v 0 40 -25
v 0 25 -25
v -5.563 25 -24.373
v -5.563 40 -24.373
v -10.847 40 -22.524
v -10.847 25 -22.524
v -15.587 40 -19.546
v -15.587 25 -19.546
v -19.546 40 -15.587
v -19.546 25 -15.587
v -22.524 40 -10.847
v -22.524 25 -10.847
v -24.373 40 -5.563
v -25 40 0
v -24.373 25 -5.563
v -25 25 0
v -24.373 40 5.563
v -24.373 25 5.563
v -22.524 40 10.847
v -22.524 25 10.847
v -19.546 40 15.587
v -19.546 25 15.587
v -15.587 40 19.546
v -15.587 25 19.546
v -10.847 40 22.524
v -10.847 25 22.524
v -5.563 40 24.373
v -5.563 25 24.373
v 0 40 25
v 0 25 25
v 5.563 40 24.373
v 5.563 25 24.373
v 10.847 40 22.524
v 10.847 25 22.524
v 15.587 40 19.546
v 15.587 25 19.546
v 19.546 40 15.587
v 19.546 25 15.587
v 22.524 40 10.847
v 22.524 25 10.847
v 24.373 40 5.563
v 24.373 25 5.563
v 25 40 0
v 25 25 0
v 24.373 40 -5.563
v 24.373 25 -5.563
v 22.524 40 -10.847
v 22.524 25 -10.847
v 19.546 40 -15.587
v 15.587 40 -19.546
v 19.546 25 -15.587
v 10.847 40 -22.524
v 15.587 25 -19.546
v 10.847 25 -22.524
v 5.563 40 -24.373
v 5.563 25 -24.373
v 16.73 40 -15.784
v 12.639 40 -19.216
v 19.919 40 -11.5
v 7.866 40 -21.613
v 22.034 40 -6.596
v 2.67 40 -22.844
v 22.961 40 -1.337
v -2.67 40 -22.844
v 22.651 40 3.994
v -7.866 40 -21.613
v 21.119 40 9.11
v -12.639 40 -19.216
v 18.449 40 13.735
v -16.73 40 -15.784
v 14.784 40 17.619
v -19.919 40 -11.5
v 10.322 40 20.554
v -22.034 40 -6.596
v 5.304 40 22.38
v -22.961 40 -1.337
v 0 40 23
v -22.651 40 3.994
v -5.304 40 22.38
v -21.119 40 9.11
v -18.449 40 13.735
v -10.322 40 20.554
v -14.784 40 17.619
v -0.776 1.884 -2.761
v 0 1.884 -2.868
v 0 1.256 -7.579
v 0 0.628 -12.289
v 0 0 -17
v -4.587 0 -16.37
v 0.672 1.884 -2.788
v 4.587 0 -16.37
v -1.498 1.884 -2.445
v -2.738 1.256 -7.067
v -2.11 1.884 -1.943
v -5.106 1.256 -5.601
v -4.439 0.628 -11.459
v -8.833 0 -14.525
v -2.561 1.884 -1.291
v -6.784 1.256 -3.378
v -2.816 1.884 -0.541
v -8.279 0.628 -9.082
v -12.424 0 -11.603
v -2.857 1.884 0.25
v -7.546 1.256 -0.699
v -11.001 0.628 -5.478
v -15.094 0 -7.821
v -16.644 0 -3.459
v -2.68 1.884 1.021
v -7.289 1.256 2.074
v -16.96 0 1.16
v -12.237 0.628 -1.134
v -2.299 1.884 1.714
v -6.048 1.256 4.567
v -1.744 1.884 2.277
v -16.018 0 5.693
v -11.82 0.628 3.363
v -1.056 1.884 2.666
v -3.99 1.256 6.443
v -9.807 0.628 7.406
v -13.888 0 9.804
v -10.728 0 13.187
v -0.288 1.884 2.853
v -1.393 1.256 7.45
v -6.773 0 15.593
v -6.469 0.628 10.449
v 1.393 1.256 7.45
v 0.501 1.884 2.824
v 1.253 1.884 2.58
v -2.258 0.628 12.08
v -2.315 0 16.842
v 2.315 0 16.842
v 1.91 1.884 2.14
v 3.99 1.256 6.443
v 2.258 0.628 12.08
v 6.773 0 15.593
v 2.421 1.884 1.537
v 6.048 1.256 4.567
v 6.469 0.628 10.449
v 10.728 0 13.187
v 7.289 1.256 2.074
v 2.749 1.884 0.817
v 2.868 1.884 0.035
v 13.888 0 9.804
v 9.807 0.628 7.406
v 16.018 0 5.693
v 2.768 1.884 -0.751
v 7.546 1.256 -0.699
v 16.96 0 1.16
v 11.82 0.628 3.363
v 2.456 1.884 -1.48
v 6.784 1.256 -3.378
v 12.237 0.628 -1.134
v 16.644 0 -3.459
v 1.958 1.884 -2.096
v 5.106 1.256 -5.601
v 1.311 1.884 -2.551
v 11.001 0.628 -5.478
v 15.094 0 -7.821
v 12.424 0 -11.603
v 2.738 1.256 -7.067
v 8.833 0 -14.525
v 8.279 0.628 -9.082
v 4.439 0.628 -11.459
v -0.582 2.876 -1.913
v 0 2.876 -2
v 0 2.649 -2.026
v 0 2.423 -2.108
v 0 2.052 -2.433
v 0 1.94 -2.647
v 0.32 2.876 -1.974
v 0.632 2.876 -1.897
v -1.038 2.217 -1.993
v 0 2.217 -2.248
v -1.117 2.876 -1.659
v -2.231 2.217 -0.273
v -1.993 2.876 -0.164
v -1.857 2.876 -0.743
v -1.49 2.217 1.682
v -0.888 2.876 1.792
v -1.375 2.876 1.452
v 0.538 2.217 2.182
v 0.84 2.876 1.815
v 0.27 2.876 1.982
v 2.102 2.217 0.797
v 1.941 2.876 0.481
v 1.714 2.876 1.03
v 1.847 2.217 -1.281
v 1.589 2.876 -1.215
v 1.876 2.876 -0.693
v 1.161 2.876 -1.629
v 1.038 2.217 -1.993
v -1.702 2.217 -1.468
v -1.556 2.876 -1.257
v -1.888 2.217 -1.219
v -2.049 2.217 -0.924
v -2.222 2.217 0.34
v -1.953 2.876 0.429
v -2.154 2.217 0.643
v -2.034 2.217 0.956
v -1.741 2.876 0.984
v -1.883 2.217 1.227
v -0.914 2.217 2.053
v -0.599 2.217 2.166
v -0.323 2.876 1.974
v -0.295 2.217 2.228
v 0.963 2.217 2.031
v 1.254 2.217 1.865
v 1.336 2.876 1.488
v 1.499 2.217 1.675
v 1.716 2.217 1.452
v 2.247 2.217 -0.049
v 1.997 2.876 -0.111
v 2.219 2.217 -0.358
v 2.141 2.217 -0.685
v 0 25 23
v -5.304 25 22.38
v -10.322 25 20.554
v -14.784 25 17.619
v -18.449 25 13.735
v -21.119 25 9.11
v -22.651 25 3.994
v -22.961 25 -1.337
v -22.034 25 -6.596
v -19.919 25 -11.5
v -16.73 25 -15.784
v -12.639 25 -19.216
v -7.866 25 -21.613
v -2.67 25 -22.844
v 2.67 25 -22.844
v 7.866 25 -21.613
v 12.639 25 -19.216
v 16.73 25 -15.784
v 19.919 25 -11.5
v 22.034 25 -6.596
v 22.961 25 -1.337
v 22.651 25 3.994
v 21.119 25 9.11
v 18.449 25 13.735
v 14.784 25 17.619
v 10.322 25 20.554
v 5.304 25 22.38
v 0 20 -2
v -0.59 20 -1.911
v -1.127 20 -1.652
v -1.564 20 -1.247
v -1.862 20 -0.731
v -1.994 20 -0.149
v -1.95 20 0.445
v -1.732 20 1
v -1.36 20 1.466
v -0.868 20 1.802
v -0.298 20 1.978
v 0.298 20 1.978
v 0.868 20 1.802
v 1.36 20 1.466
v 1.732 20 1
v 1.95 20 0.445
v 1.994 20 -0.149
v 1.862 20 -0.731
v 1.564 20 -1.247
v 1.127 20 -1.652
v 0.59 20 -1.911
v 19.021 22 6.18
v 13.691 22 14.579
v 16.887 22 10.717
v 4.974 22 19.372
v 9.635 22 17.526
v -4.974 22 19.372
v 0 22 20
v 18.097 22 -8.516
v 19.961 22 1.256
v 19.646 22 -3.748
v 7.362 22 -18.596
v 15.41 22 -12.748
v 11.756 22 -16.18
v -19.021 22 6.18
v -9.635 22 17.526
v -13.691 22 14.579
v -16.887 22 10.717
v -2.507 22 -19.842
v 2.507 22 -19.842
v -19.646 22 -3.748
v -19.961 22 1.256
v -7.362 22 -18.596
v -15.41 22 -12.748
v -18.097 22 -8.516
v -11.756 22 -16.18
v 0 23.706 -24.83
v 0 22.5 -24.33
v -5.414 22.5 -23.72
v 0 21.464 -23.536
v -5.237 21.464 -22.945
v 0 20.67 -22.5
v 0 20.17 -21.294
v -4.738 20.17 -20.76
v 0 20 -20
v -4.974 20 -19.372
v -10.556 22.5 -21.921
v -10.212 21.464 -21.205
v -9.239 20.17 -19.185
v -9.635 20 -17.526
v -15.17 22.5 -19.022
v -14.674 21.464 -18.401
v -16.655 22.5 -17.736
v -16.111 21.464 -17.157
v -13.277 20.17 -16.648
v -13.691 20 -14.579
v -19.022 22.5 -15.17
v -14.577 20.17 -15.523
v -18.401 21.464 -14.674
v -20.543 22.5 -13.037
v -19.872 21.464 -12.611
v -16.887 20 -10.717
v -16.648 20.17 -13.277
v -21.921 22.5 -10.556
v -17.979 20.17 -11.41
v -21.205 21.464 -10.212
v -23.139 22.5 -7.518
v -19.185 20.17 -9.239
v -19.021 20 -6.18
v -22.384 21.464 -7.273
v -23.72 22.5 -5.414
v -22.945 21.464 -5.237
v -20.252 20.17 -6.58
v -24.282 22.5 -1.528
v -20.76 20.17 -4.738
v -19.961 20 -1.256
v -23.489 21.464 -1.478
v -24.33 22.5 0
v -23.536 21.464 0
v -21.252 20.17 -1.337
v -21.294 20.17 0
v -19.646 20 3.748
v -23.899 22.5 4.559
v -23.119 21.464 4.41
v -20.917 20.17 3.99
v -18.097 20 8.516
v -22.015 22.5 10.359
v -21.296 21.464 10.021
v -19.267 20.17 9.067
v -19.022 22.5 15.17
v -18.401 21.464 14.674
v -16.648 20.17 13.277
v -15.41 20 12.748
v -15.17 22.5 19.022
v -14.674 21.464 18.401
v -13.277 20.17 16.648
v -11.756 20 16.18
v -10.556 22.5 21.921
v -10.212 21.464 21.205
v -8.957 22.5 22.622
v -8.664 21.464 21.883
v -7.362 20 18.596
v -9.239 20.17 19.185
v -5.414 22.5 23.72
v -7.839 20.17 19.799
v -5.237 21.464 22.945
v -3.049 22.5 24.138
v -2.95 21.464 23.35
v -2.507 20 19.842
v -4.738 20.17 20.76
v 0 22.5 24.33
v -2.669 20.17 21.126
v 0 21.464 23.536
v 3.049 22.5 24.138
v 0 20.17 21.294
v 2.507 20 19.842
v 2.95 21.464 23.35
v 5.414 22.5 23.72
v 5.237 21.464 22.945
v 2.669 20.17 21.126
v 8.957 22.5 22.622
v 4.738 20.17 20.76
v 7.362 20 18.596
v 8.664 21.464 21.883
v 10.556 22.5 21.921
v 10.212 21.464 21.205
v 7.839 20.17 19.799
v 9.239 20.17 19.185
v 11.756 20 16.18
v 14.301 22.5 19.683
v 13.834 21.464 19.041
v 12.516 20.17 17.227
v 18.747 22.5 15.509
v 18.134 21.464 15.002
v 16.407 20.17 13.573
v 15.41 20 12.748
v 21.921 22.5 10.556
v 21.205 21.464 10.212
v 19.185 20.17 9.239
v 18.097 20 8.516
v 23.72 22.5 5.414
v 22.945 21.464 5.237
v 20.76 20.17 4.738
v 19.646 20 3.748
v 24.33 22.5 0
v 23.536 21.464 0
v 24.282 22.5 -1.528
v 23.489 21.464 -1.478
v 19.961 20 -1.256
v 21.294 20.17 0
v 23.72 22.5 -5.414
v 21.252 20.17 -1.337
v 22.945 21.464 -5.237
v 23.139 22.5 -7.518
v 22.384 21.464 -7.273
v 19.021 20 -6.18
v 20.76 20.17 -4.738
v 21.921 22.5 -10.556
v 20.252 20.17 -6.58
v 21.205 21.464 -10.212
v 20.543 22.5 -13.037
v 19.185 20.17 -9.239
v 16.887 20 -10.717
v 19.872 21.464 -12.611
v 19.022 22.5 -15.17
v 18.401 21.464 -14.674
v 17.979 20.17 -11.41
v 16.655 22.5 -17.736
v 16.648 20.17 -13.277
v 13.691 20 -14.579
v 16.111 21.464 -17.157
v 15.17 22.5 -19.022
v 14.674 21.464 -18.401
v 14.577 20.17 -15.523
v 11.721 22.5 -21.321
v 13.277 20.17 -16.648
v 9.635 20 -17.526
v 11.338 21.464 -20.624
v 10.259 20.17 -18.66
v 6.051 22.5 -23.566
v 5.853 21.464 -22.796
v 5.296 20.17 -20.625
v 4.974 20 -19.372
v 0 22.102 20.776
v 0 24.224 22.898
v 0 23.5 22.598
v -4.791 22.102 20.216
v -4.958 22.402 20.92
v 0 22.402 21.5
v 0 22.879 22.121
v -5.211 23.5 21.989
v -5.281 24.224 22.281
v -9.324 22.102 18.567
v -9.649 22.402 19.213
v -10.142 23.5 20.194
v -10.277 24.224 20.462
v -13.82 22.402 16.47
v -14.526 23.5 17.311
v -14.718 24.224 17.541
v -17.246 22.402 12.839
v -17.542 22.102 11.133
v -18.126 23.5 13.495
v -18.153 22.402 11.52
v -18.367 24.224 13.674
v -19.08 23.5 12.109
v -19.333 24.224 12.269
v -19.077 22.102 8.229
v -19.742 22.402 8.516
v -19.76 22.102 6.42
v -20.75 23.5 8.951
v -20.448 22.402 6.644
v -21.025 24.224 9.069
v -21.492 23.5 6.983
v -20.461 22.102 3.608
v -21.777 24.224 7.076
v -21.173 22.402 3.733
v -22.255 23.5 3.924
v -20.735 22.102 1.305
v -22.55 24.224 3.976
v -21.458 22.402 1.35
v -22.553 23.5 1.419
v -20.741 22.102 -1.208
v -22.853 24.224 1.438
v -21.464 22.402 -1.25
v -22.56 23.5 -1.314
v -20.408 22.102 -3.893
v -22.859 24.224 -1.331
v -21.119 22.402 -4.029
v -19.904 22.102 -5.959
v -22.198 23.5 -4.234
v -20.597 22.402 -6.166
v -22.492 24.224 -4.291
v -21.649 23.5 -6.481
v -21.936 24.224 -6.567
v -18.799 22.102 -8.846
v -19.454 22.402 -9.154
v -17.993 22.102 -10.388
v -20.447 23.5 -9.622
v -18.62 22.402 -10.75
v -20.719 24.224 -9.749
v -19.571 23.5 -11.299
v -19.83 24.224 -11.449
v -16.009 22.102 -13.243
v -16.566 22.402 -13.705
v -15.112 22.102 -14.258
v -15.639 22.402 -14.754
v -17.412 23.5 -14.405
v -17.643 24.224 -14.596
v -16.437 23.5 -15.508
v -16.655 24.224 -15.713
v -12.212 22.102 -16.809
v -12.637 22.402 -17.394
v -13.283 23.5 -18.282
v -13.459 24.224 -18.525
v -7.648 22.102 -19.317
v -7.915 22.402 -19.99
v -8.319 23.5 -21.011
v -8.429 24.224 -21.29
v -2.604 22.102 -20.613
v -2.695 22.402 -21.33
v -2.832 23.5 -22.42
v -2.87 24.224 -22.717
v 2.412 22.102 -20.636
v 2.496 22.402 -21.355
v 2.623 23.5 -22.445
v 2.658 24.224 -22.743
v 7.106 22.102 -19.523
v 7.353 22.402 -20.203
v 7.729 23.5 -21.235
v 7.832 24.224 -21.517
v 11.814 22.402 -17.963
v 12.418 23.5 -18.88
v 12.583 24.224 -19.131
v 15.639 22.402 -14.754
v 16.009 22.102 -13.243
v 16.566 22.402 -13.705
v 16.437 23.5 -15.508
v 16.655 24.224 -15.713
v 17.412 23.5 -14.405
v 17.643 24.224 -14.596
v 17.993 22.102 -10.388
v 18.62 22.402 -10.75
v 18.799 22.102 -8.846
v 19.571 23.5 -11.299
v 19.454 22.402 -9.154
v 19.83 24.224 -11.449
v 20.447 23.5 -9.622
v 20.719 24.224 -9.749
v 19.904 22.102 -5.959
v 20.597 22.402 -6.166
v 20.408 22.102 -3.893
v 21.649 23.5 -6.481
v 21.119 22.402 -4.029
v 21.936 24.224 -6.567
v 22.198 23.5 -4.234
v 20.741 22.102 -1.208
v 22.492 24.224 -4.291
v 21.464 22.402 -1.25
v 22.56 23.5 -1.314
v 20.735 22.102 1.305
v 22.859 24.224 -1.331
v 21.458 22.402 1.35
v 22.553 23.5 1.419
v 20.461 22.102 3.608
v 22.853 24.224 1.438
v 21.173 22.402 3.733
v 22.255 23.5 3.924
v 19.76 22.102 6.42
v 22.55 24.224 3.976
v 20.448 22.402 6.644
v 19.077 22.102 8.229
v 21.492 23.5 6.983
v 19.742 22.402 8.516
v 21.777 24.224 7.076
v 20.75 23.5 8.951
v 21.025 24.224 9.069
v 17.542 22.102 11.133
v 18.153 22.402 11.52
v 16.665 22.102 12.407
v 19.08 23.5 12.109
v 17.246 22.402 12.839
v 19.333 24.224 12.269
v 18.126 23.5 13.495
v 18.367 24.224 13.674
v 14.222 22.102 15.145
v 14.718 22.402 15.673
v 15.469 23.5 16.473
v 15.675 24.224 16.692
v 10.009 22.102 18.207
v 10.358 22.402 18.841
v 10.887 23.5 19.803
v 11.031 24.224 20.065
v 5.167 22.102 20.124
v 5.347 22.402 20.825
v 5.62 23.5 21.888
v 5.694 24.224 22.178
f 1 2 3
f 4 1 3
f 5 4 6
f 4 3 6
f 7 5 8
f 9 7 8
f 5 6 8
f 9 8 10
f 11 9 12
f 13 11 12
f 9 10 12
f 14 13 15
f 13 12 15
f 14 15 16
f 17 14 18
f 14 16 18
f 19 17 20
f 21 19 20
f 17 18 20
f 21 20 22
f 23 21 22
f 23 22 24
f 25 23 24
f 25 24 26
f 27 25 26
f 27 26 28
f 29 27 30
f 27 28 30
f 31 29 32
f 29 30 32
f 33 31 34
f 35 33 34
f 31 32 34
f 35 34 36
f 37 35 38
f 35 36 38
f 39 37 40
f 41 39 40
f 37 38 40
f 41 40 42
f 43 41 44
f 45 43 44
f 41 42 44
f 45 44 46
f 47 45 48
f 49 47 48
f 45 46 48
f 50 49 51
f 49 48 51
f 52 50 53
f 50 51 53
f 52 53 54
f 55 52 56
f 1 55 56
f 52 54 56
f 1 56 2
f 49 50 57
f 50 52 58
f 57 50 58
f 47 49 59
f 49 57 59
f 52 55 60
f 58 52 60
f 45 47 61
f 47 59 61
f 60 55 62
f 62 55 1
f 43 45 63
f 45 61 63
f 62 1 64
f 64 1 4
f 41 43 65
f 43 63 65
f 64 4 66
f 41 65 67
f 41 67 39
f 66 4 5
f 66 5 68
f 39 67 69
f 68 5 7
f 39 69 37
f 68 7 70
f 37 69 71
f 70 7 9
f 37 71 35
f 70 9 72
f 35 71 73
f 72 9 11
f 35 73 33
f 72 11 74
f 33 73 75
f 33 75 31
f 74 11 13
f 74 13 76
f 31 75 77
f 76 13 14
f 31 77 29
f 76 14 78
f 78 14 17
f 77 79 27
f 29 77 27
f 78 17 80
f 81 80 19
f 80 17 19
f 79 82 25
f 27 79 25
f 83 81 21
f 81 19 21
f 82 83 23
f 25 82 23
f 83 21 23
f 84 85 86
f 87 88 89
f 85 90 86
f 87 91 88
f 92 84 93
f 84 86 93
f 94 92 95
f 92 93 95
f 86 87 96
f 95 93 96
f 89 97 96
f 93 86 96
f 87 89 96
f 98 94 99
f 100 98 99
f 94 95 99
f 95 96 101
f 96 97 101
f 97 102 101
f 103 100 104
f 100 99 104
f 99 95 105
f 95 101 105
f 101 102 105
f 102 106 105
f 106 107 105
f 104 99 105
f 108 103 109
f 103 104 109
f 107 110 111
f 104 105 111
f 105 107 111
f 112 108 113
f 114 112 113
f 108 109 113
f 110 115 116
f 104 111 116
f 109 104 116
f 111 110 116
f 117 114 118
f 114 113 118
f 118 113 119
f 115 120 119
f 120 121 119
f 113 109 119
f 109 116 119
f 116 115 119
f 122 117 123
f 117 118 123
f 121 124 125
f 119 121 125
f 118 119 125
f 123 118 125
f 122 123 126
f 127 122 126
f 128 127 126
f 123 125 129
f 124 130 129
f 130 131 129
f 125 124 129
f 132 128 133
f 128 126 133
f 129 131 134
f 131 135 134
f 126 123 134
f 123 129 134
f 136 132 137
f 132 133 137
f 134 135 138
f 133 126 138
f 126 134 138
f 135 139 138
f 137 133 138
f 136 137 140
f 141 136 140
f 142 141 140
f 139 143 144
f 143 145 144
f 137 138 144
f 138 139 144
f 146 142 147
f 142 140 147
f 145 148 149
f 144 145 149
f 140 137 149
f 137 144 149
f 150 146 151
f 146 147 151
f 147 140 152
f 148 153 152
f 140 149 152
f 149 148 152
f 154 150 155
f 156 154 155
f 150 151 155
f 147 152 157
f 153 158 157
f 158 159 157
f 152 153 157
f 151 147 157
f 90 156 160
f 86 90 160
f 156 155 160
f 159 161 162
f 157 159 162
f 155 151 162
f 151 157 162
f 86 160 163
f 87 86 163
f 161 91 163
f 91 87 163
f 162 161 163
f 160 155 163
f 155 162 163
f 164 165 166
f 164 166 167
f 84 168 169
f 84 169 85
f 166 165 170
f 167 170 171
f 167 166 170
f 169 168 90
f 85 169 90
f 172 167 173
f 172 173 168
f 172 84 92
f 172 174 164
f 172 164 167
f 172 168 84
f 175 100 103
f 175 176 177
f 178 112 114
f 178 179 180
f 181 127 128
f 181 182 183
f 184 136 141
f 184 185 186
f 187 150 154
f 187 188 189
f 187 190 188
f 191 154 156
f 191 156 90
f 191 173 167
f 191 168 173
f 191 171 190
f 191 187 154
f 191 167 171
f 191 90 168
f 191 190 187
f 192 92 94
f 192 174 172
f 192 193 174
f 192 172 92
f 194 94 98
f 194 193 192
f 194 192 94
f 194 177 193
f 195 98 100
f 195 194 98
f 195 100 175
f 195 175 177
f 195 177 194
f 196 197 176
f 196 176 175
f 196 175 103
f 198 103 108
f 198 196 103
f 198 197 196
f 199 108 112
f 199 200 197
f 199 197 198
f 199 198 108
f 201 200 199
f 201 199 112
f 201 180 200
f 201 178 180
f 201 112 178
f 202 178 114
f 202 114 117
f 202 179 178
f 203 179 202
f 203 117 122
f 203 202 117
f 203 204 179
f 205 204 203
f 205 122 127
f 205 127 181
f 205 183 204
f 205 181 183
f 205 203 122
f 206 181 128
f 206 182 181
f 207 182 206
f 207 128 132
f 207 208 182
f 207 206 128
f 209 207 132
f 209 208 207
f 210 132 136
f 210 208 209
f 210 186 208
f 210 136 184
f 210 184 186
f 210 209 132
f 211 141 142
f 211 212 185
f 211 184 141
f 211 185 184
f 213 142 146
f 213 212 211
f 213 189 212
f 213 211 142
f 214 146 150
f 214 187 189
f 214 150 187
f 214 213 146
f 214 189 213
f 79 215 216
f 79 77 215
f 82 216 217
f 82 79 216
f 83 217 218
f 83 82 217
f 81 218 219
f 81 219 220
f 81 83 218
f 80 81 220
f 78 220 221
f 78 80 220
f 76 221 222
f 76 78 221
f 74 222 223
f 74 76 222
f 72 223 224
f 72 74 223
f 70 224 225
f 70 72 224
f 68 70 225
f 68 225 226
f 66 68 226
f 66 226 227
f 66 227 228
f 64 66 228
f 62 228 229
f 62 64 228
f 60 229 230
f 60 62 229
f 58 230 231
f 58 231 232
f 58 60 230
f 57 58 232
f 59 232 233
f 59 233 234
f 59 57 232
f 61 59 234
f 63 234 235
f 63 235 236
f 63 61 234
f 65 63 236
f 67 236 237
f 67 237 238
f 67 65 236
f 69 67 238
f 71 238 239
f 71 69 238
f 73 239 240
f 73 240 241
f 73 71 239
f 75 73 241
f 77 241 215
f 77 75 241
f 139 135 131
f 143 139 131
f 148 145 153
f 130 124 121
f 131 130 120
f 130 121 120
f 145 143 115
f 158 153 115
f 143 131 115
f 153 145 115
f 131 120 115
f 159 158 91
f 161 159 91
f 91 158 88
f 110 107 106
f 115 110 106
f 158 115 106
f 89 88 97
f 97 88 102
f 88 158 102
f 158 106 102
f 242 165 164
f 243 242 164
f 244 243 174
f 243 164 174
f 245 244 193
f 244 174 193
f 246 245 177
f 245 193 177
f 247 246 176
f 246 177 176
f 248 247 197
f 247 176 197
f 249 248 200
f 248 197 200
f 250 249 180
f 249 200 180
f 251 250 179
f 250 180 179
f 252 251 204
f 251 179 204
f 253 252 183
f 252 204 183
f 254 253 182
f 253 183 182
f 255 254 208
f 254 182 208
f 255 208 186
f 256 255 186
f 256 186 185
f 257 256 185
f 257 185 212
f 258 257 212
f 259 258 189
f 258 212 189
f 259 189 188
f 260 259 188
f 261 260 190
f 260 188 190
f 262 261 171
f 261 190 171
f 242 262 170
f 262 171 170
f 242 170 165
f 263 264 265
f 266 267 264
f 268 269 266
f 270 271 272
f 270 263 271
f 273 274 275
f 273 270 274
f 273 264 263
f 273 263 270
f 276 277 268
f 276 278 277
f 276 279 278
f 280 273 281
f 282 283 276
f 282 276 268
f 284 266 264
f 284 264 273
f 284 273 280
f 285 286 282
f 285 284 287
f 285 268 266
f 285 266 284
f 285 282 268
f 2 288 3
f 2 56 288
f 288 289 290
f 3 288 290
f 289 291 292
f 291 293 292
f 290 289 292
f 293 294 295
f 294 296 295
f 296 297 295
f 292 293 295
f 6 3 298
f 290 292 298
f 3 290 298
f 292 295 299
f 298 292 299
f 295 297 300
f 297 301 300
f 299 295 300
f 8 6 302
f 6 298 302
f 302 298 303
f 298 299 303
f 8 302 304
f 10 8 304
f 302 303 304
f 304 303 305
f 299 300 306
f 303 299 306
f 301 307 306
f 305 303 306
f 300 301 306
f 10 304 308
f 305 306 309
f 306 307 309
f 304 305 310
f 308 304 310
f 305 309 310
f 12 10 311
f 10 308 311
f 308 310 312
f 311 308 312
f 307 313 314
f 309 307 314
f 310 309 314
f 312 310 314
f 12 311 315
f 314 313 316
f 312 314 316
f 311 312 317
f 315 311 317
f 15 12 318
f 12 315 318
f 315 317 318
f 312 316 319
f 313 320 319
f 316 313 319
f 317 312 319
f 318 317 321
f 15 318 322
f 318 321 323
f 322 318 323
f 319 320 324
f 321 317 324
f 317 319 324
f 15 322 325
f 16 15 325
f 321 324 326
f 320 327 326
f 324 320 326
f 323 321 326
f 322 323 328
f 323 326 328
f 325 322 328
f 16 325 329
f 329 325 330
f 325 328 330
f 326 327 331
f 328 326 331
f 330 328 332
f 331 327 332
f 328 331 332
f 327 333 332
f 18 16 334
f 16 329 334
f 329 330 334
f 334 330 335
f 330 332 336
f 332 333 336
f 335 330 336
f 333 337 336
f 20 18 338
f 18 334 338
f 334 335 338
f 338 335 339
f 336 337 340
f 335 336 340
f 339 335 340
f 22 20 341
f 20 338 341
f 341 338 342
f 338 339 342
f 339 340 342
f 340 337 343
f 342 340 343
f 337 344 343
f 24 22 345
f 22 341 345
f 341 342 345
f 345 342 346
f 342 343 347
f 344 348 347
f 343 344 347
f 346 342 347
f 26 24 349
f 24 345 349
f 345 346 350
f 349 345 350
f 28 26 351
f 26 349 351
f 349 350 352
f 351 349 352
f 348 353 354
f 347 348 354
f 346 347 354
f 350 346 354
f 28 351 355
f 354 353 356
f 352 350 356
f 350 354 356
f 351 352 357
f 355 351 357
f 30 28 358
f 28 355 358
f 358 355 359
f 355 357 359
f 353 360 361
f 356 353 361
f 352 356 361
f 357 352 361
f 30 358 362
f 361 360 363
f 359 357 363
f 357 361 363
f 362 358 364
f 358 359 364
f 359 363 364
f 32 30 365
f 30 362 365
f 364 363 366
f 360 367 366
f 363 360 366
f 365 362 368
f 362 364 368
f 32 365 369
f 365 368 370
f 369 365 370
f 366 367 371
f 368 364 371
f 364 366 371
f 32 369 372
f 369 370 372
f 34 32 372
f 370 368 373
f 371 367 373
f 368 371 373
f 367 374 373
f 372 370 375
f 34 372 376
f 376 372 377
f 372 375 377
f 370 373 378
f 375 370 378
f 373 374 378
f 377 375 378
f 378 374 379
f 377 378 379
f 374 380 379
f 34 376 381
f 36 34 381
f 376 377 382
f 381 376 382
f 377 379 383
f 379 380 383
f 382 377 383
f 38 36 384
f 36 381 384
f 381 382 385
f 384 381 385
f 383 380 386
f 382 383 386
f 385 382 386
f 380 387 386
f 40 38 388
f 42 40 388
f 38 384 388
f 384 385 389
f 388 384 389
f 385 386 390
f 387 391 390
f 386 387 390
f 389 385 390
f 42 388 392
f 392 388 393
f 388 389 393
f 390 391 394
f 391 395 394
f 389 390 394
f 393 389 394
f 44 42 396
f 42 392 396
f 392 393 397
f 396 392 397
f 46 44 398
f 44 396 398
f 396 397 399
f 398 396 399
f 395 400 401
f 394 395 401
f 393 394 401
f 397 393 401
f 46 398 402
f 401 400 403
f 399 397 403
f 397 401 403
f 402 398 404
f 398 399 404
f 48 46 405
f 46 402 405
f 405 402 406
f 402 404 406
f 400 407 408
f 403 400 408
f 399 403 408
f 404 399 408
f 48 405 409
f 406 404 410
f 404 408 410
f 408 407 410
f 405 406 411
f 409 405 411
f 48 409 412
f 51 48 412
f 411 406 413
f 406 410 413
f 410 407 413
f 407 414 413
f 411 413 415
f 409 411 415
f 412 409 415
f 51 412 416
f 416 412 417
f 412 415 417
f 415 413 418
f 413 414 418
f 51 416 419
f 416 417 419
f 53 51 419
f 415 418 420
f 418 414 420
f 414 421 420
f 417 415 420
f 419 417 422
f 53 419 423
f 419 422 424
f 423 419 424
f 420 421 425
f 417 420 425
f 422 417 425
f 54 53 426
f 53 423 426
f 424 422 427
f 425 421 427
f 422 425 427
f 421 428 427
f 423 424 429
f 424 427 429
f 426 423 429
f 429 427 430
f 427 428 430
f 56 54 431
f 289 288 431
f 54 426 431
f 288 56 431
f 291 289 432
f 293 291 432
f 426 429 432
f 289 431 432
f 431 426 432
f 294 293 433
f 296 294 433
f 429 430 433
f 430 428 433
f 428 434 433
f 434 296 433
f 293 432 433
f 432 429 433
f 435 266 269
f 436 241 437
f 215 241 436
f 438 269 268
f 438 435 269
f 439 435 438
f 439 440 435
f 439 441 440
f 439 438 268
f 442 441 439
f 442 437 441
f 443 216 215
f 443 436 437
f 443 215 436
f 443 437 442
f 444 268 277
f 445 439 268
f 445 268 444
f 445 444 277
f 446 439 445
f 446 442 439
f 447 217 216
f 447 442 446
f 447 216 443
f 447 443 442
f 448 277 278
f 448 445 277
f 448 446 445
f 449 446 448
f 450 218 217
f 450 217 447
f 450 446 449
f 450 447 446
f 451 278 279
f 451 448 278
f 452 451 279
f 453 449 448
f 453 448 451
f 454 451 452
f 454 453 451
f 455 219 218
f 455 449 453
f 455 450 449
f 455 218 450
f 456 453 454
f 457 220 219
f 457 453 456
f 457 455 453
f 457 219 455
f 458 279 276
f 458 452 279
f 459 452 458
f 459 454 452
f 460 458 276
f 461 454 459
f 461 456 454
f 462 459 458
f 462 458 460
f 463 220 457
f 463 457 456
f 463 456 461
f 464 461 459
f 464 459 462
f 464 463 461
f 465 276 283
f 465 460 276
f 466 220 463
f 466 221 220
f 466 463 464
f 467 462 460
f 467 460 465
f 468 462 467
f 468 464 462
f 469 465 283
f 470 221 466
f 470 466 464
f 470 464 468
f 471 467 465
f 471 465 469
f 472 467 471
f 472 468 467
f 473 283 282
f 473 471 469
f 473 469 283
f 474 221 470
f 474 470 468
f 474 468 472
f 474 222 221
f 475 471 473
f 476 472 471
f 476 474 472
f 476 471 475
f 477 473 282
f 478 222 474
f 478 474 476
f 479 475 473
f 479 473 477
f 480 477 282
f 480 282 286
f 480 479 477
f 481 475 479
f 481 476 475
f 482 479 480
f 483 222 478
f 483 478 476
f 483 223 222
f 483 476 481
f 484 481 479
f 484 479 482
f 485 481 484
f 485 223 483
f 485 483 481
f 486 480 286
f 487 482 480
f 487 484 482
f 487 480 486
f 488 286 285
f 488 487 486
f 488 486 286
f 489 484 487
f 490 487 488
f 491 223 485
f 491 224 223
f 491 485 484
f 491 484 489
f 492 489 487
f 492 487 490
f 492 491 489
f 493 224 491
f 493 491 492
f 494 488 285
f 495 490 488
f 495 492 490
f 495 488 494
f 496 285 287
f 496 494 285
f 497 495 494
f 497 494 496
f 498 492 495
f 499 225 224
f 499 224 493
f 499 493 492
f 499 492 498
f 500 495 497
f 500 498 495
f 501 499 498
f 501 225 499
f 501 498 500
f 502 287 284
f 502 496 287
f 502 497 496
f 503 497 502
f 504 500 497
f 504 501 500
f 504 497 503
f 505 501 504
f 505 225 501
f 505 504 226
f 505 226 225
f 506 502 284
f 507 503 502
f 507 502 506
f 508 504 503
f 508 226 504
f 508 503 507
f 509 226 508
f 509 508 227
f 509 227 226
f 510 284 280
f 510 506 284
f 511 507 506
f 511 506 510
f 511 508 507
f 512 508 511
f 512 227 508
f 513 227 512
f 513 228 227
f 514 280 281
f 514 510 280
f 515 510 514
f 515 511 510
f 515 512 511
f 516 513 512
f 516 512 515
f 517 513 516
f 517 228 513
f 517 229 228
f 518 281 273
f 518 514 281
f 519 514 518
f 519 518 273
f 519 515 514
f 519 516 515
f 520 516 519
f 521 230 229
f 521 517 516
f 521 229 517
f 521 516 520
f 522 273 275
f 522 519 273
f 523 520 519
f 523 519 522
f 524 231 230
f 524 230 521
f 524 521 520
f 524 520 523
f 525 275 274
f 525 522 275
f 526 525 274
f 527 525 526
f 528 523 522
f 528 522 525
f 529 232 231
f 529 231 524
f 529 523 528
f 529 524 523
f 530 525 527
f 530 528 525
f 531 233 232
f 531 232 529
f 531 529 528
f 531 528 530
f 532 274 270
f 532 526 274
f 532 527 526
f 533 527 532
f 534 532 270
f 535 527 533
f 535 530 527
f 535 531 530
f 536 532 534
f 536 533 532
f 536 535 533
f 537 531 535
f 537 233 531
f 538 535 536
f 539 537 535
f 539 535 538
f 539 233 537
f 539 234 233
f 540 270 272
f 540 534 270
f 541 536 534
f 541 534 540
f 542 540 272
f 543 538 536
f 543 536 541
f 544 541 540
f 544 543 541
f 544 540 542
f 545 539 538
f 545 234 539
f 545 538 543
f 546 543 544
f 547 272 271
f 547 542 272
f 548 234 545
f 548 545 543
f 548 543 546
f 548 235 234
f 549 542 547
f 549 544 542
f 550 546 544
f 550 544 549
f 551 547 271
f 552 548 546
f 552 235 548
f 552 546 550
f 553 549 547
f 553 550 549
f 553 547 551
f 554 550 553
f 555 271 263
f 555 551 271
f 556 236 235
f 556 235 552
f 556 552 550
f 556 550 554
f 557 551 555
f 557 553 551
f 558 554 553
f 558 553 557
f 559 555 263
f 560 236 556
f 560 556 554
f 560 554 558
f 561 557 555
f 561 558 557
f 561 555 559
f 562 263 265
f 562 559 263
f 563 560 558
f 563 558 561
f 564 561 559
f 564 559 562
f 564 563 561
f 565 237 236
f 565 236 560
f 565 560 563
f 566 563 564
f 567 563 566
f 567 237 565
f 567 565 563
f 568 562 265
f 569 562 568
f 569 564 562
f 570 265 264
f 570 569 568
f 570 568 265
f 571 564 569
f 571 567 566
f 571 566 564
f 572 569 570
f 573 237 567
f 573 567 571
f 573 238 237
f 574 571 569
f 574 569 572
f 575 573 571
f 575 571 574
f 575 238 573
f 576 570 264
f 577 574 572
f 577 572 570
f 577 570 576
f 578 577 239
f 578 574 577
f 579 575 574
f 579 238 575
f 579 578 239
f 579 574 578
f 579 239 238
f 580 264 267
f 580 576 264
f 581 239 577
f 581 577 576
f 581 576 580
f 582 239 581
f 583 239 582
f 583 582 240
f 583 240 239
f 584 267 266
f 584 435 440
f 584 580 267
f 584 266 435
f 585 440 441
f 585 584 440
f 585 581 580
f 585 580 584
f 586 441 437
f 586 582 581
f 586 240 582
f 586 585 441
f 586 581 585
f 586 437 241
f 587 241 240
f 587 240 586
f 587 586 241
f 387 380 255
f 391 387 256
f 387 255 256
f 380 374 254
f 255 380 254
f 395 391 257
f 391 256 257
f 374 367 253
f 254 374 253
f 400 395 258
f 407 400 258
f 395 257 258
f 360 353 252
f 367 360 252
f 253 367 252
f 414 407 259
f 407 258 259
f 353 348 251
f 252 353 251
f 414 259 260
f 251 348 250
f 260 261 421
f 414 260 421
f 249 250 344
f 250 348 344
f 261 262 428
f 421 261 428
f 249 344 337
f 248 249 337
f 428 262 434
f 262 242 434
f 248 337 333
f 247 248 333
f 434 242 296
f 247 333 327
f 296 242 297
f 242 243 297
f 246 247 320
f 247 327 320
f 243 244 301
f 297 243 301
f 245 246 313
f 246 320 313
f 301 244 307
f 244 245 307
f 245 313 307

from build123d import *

# Parameters (mm, degrees)
FILLET_1_R = 5
FILLET_2_R = 1


with BuildPart() as part:
    # 草圖1 → 旋轉1 (revolve)
    with BuildSketch(Plane.XY, mode=Mode.PRIVATE) as revolve_1_sk:
        Polygon((0, 0), (0, 40), (25, 40), (25, 20), (2, 20), (2, 2), (17, 0), align=None)
    revolve(revolve_1_sk.sketch.rotate(Axis((0, 0, 0), (0, 1, 0)), 90), axis=Axis((0, 0, 0), (0, 1, 0)))

    # 圓角1
    fillet_1_edges = [part.edges().sort_by_distance(p)[0] for p in [
        (0, 20, 25),
    ]]
    fillet(fillet_1_edges, radius=FILLET_1_R)

    # 圓角2
    fillet_2_edges = [part.edges().sort_by_distance(p)[0] for p in [
        (0, 2, 2),
    ]]
    fillet(fillet_2_edges, radius=FILLET_2_R)

    # 草圖2 → 除料-旋轉1 (revolve, cut)
    with BuildSketch(Plane.XY, mode=Mode.PRIVATE) as cut_revolve_1_sk:
        with BuildLine():
            Line((23, 40), (0, 40))
            Line((0, 40), (0, 22))
            Line((0, 22), (20, 22))
            ThreePointArc((20, 22), (22.121320344, 22.878679656), (23, 25))
            Line((23, 25), (23, 40))
        make_face()
    revolve(cut_revolve_1_sk.sketch.rotate(Axis((0, 40, 0), (0, -1, 0)), 90), axis=Axis((0, 40, 0), (0, -1, 0)), mode=Mode.SUBTRACT)


solid = part.part
